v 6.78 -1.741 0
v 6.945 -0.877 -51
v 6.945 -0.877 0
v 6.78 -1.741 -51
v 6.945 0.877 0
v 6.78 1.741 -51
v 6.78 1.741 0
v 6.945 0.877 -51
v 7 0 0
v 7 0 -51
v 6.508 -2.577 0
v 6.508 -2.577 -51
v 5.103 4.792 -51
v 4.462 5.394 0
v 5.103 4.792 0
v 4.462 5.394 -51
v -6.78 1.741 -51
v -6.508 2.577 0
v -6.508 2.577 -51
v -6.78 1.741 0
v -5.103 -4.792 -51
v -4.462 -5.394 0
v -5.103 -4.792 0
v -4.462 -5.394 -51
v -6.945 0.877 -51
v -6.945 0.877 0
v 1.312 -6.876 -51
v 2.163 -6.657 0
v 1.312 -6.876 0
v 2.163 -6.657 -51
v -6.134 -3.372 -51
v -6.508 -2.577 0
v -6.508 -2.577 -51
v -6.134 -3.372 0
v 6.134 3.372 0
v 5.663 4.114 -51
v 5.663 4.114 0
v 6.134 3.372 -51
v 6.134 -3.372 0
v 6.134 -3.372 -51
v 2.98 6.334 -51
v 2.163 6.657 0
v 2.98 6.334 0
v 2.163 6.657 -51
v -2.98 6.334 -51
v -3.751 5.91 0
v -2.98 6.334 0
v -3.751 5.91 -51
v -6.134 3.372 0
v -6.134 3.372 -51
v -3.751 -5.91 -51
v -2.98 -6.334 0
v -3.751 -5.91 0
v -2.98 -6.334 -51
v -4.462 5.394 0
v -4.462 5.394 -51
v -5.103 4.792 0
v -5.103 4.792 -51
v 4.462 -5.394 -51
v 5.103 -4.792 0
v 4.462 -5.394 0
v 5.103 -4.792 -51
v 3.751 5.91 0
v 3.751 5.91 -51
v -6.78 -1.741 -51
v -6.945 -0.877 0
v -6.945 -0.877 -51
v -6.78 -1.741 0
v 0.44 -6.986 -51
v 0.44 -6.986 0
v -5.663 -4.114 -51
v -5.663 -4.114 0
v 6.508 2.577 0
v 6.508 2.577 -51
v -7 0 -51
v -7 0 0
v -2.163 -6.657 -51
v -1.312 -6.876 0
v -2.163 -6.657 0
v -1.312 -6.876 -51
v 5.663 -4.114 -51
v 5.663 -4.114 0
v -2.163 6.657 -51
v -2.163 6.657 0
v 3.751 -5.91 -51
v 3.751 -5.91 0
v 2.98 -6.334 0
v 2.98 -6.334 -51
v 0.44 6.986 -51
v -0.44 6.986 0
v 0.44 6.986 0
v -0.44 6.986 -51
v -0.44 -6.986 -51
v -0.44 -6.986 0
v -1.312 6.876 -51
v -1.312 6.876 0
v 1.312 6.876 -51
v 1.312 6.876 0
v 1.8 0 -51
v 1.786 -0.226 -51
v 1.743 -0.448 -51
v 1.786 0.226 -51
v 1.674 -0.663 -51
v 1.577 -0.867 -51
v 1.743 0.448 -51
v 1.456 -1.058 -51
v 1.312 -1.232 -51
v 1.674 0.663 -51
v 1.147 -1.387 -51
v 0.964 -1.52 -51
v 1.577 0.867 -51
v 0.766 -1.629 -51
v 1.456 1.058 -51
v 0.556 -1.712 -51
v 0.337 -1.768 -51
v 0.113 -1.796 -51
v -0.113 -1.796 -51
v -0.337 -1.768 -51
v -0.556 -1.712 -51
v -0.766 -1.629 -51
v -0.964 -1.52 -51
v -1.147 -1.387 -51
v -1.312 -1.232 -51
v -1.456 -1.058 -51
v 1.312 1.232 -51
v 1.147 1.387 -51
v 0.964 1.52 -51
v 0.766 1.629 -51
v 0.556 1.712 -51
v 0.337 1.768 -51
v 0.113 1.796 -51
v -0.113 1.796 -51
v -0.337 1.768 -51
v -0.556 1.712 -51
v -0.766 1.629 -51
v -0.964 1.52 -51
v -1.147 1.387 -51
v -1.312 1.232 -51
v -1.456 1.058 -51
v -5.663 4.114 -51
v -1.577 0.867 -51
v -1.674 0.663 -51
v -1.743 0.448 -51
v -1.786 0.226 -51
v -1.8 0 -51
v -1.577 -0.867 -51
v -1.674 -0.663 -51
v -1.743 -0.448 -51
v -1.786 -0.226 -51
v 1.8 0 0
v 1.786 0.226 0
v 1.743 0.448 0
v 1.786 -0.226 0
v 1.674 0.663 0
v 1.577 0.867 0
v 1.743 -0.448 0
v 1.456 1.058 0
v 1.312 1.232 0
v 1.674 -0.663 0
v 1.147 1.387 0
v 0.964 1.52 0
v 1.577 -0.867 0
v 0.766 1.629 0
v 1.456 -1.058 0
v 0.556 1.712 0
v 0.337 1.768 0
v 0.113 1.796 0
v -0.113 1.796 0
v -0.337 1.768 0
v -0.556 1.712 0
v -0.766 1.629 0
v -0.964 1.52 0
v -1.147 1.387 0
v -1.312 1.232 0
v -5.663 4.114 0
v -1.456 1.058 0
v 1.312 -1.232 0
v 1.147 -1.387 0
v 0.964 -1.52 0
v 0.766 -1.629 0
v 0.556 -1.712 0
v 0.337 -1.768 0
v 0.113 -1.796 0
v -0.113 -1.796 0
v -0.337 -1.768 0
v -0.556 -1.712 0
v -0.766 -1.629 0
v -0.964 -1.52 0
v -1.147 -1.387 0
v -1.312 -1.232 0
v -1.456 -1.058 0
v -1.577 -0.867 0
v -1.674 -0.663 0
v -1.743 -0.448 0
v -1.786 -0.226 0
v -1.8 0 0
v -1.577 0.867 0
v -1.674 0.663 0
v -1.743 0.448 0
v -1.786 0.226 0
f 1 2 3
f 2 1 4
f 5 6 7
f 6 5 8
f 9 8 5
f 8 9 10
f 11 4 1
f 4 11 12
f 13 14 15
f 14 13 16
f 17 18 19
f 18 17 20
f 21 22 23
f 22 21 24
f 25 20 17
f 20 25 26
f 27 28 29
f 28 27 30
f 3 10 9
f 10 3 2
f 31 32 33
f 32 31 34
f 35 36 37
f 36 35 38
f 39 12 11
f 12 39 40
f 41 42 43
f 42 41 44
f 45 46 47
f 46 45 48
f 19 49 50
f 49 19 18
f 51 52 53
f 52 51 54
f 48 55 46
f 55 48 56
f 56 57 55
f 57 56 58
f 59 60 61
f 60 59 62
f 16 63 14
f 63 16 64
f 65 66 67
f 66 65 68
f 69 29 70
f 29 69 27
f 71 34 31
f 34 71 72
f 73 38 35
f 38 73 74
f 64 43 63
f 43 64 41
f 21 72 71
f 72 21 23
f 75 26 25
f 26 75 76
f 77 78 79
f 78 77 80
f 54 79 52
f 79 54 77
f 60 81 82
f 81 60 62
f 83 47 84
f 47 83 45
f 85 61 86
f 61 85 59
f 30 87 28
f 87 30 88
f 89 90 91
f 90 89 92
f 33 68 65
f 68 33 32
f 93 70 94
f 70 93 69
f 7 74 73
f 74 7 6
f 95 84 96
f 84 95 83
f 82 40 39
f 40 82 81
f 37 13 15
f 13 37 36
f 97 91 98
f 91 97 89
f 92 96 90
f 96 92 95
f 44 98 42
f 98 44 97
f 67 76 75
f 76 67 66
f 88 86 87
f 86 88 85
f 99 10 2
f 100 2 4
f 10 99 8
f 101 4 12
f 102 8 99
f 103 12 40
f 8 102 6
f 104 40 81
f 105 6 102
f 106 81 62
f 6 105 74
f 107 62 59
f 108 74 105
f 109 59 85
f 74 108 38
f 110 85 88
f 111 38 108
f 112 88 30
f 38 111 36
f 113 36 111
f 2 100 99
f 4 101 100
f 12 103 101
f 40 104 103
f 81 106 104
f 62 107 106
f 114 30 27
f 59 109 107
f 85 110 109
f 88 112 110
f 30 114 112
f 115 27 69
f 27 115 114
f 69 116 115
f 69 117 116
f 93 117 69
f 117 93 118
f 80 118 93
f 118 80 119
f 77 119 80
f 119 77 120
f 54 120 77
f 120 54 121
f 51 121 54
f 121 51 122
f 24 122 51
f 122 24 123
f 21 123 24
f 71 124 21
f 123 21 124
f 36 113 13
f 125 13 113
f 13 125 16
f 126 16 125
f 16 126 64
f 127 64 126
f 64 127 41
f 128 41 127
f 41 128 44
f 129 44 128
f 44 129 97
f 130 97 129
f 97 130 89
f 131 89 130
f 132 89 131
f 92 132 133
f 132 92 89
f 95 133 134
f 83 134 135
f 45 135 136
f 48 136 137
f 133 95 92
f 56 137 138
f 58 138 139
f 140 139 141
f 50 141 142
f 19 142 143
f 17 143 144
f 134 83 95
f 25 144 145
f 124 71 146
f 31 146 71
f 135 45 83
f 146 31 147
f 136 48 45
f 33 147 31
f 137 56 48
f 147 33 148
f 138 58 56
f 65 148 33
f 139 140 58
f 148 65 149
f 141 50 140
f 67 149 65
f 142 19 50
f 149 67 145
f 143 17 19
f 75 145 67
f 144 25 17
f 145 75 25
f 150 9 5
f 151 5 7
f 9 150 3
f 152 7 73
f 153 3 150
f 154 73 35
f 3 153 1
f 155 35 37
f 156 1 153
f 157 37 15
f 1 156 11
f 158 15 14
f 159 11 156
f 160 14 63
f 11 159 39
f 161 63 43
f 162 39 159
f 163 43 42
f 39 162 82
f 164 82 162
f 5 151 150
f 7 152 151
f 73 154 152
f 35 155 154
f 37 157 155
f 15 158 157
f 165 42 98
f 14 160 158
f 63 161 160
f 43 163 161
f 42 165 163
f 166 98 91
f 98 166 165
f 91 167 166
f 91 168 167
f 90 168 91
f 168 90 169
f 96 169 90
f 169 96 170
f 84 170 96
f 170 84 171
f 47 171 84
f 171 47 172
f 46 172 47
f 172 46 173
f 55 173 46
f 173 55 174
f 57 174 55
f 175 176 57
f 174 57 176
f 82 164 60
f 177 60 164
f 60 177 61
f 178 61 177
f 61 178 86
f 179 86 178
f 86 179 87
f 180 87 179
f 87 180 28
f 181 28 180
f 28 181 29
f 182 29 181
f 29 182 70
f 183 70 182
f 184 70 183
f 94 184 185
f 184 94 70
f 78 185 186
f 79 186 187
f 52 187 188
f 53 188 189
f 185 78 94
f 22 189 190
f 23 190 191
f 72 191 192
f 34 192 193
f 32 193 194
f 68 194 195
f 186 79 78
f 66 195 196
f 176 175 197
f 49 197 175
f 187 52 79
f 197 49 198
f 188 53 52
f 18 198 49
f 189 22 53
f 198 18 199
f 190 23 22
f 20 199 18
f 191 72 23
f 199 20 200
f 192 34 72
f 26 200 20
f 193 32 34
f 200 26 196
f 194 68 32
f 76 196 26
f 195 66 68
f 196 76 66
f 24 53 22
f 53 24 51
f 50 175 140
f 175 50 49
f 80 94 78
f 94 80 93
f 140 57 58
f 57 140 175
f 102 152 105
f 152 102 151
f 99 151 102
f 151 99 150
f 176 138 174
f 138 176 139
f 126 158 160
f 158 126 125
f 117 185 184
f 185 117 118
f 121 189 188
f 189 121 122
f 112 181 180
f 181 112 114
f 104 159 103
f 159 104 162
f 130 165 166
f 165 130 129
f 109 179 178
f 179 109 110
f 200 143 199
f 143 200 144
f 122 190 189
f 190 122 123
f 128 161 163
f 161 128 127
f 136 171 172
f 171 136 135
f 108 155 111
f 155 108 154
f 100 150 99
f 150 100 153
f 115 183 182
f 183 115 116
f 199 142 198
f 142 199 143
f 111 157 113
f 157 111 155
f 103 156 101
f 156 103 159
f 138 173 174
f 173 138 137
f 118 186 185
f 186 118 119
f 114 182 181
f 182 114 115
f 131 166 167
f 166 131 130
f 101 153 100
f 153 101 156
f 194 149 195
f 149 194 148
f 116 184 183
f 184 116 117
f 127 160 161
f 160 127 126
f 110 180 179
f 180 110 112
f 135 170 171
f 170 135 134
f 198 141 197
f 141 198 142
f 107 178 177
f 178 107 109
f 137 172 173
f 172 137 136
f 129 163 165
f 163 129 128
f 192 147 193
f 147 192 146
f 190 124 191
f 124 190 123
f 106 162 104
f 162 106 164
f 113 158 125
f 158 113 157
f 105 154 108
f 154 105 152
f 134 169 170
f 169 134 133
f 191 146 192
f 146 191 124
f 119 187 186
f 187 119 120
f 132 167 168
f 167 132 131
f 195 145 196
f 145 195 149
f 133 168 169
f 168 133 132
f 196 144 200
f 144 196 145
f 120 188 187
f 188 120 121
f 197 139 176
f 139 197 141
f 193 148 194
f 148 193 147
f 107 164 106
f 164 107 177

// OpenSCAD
$fn = 50;


difference() {
	union() {
		translate(v = [0, 0, -51.0000000000]) {
			cylinder(h = 51, r = 7.0000000000);
		}
		cylinder(h = 0, r = 13.0000000000);
	}
	union() {
		#translate(v = [0, 0, -51]) {
			cylinder(h = 51, r = 1.8000000000);
		}
	}
}
